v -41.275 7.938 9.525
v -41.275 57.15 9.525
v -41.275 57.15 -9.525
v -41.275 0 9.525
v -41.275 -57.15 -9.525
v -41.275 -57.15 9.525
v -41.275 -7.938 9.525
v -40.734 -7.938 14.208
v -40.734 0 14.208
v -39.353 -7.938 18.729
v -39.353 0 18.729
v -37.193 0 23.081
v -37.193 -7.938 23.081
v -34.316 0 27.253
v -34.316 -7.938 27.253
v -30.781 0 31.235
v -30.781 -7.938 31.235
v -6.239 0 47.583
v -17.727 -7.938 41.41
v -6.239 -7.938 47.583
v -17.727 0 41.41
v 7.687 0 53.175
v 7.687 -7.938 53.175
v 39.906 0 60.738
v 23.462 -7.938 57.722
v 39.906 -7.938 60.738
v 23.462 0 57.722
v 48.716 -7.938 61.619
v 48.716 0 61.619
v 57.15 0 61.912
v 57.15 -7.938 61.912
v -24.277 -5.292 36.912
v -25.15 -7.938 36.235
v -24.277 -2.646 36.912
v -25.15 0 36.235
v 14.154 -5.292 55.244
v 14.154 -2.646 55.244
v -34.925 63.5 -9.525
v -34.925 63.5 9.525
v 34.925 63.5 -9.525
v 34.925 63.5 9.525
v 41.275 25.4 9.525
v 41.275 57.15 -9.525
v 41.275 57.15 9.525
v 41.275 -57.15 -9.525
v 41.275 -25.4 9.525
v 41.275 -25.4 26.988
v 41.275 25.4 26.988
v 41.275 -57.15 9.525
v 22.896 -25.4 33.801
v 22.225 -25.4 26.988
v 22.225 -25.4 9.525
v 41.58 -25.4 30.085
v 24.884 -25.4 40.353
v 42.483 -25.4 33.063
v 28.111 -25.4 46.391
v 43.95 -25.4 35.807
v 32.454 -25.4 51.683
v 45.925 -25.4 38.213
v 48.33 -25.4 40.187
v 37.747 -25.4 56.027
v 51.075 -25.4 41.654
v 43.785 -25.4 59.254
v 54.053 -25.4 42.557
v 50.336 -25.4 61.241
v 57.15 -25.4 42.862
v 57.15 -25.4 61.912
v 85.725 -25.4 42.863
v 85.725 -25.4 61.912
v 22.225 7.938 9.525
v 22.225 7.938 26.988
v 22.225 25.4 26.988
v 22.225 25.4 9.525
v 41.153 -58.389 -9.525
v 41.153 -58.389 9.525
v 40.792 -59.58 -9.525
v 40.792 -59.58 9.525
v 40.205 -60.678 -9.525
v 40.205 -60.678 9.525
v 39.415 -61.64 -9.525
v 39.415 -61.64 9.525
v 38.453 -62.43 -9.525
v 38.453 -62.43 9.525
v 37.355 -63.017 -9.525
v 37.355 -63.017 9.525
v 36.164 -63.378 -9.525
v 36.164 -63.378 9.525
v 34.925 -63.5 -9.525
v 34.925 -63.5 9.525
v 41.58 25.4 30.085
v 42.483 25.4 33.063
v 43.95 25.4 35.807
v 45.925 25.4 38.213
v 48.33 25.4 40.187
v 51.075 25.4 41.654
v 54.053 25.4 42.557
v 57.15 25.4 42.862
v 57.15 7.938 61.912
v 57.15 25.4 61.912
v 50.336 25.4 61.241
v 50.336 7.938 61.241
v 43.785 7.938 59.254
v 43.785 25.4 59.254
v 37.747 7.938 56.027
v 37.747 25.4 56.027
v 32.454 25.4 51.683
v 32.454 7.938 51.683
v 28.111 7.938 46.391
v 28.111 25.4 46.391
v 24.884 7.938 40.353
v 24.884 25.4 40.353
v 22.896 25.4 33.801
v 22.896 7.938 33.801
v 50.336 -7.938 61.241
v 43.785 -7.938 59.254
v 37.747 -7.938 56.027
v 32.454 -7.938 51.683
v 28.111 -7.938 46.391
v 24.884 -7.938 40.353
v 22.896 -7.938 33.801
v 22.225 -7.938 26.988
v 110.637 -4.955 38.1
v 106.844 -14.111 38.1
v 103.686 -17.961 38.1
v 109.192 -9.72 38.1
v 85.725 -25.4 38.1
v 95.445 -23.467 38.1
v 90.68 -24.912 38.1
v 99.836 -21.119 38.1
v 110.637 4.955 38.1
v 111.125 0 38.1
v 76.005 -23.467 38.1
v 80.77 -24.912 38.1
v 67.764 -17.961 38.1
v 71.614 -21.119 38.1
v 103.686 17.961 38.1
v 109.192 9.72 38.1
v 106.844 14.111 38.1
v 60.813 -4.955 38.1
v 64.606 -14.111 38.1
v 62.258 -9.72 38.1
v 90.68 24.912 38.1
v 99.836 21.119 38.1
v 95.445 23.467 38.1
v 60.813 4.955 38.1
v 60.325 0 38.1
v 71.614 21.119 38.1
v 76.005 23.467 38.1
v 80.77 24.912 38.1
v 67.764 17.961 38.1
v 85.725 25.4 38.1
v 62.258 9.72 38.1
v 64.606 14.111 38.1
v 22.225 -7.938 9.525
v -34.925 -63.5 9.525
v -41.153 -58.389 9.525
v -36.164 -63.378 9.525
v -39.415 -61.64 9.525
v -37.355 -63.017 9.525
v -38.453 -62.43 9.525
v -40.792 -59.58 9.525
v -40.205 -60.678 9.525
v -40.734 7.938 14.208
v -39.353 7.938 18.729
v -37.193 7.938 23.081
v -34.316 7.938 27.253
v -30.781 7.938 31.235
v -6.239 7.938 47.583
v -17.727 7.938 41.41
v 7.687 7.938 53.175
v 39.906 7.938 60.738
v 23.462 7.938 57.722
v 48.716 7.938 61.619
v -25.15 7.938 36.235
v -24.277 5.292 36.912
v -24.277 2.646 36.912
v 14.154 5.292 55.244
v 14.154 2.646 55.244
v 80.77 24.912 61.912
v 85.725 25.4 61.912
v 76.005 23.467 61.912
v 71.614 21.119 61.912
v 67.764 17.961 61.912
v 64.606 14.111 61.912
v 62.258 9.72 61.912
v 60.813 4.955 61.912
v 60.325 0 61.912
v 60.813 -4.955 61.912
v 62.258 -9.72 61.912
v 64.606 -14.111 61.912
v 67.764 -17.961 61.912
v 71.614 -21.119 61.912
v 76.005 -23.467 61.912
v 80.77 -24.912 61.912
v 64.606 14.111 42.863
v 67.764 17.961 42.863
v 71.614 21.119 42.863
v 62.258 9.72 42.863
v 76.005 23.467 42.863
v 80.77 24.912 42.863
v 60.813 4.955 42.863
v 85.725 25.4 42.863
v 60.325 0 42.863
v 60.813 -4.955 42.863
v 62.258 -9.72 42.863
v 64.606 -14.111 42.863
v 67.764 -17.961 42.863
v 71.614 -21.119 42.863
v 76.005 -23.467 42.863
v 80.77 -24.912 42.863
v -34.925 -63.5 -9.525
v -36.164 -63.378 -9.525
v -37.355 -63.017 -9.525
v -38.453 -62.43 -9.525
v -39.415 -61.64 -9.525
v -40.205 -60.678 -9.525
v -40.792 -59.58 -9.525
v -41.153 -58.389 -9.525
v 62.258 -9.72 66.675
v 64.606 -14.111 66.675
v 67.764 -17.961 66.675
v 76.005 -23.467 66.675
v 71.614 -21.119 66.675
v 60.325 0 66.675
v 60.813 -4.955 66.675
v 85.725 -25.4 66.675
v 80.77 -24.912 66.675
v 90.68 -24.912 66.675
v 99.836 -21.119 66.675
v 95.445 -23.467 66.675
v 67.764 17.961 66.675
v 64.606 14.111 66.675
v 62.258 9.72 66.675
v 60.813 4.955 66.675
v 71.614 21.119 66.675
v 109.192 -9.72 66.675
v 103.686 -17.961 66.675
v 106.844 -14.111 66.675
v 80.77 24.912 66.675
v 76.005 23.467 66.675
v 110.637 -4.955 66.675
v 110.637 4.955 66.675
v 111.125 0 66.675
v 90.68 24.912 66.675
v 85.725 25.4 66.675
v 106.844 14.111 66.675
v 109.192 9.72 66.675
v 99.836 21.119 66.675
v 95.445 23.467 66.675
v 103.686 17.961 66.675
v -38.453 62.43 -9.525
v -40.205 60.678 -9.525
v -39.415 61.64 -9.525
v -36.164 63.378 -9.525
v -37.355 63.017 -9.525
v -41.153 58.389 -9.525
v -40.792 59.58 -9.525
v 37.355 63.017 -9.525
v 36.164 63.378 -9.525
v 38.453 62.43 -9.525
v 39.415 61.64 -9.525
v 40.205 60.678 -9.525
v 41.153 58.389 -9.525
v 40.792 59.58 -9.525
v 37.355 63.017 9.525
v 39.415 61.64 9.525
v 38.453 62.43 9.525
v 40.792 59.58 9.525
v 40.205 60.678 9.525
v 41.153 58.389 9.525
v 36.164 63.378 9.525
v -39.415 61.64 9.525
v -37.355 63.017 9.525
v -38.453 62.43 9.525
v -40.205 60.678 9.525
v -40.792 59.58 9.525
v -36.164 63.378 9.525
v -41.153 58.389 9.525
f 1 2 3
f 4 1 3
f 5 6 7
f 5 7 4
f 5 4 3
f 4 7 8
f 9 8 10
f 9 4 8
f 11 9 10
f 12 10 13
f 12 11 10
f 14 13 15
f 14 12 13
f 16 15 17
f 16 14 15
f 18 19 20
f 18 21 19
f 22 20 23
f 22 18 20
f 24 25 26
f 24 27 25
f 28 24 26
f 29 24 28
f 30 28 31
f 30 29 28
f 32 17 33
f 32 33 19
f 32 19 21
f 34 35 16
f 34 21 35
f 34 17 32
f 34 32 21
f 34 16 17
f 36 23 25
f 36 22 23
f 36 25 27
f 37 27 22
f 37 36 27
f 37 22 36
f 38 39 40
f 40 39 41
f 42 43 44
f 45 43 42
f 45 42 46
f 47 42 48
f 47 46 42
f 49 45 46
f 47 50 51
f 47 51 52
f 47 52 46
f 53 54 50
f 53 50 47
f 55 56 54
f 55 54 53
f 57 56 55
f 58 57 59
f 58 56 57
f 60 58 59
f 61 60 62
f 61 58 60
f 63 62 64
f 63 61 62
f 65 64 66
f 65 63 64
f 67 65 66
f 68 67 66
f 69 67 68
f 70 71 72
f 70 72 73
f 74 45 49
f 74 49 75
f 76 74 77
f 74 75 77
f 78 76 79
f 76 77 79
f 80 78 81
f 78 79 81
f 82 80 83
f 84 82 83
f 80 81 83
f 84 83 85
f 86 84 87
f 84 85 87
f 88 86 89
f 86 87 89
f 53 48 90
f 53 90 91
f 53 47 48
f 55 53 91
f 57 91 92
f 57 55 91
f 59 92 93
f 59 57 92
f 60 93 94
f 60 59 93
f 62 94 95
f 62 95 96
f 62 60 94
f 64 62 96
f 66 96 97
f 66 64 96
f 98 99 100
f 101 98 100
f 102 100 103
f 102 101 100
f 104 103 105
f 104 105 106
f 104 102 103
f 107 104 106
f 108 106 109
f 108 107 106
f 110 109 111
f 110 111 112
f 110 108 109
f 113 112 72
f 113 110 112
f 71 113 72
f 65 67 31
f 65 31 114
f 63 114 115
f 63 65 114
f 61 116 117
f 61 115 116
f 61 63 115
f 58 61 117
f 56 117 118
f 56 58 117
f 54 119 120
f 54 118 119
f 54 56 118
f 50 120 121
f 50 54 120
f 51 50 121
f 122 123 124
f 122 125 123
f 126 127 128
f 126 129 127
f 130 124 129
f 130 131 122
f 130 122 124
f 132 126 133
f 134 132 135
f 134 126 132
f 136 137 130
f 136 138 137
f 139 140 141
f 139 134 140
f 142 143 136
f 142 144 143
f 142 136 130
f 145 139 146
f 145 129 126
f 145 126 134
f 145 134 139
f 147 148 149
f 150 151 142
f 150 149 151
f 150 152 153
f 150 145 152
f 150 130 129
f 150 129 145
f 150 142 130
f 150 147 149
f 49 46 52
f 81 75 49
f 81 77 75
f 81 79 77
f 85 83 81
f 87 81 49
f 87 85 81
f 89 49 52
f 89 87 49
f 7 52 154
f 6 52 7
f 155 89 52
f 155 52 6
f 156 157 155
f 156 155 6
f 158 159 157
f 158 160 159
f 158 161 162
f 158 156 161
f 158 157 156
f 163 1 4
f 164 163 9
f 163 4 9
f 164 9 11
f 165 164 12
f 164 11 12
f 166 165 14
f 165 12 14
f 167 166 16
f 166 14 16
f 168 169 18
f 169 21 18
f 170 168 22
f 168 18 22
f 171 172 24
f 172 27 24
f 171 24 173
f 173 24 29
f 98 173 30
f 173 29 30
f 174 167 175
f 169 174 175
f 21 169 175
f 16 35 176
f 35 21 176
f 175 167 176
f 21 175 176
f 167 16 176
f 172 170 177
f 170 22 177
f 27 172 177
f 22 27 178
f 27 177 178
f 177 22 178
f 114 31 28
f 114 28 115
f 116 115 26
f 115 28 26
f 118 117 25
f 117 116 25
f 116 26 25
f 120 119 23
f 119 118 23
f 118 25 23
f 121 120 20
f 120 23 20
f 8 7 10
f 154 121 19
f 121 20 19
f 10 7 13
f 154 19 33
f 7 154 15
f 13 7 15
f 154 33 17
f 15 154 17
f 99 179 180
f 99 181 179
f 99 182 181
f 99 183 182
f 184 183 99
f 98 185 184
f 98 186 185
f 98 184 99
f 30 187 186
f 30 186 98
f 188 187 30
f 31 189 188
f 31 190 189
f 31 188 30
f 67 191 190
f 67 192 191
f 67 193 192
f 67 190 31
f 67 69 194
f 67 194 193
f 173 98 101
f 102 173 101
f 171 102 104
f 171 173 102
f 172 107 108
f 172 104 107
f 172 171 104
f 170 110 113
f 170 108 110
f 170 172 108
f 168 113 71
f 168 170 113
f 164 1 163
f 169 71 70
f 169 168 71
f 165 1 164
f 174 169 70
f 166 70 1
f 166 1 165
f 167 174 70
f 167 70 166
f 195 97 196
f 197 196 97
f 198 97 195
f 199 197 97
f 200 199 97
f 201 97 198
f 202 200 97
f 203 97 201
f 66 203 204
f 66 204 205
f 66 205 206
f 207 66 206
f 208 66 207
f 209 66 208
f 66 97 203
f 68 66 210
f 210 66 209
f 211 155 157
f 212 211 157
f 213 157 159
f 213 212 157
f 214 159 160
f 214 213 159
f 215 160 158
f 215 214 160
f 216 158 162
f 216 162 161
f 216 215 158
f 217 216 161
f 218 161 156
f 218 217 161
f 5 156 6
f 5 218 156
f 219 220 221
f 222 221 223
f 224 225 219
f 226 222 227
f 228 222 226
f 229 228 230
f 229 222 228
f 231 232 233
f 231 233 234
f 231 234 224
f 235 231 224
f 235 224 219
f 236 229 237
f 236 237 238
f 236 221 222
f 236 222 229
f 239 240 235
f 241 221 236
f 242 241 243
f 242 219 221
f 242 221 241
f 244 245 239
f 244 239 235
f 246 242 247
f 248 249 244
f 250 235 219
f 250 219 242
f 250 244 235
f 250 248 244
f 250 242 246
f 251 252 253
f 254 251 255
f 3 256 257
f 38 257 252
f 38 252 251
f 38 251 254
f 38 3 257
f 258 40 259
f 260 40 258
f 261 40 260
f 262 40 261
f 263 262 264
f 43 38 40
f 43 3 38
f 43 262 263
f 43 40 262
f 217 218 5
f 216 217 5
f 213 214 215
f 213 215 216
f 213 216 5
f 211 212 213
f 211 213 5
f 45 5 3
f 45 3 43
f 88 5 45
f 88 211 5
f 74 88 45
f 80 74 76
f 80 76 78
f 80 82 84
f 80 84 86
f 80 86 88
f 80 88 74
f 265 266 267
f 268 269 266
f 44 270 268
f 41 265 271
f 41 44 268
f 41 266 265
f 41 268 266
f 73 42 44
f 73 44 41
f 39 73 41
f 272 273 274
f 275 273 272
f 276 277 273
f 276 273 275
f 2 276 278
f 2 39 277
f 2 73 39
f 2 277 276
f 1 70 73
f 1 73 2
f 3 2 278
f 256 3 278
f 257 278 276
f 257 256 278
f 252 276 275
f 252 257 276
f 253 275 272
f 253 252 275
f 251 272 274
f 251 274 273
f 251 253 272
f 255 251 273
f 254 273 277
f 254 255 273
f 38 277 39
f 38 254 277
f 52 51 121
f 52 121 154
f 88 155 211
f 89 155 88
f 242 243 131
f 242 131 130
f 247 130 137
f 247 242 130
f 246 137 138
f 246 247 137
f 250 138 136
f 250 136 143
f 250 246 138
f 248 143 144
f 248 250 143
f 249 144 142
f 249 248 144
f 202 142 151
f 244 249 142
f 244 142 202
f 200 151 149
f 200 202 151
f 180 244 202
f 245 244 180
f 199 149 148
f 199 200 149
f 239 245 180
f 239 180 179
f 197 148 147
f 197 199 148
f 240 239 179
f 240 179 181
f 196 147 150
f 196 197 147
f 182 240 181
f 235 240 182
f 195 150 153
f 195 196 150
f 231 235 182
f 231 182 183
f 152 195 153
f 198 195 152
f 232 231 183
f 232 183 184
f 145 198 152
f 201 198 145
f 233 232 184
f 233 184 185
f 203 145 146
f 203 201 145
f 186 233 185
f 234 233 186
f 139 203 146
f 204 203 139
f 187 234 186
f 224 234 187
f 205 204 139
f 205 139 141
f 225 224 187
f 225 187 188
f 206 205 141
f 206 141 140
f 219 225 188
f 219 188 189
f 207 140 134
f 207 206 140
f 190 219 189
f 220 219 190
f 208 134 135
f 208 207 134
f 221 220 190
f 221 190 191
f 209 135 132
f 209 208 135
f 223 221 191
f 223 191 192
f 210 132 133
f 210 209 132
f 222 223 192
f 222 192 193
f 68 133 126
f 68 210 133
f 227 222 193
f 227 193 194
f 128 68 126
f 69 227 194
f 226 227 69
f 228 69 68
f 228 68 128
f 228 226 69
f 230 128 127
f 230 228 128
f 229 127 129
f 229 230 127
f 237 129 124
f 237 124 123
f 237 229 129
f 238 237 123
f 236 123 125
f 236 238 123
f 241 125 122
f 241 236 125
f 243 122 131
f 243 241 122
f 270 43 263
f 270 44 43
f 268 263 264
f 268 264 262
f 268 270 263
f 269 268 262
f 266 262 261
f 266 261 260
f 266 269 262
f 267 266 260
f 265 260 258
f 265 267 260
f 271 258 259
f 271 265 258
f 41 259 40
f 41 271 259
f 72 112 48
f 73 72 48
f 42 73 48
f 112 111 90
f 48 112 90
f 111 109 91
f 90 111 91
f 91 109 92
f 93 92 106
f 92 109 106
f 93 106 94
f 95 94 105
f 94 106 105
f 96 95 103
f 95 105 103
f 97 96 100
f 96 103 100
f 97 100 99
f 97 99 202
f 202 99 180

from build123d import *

# Parameters (mm, degrees)
F1_DEPTH = 63.5
F0_W     = 25.4
F0_H     = 19.05
F2_DEPTH = 25.4
F3_DEPTH = 7.9375
F5_R     = 6.35


# Not quite as in the source:
# - a feature names something its author has since deleted; it is built from what else it names


with BuildPart() as f1:
    # F0 (on Front) → F1 (new body, symmetric)
    with BuildSketch(Plane.XZ):
        Polygon((-41.275, 9.525), (-41.275, -9.525), (41.275, -9.525), (41.275, 9.525), (22.225, 9.525), align=None)
    extrude(amount=F1_DEPTH, both=True)

    # F0 (on Front) → F2 (join, symmetric)
    with BuildSketch(Plane.XZ):
        with Locations((73.025, 52.3875)):
            Rectangle(F0_W, F0_H)
        with BuildLine():
            Line((22.225, 9.525), (41.275, 9.525))
            Line((41.275, 9.525), (41.275, 26.9875))
            ThreePointArc((41.275, 26.9875), (45.9246798487, 38.2128201513), (57.15, 42.8625))
            Line((57.15, 42.8625), (60.325, 42.8625))
            Line((60.325, 42.8625), (60.325, 61.9125))
            Line((60.325, 61.9125), (57.15, 61.9125))
            ThreePointArc((57.15, 61.9125), (32.4542956671, 51.6832043329), (22.225, 26.9875))
            Line((22.225, 26.9875), (22.225, 9.525))
        make_face()
    extrude(amount=F2_DEPTH, both=True)

    # F0 (on Front) → F3 (join, symmetric)
    with BuildSketch(Plane.XZ):
        with BuildLine():
            add(Edge.make_bspline(
                [(-41.275, 9.525), (-40.6160876155, 40.568407625), (17.4937602133, 61.9470998645), (57.15, 61.9125)],
                knots=[0, 0, 0, 0, 111.4985685166, 111.4985685166, 111.4985685166, 111.4985685166], degree=3))
            Line((-41.275, 9.525), (22.225, 9.525))
            Line((22.225, 9.525), (22.225, 26.9875))
            ThreePointArc((22.225, 26.9875), (32.4542956671, 51.6832043329), (57.15, 61.9125))
        make_face()
    extrude(amount=F3_DEPTH, both=True)

    # F0 (on Front) → F4 (revolve)
    with BuildSketch(Plane.XZ):
        Polygon((85.725, 66.675), (85.725, 61.9125), (85.725, 42.8625), (85.725, 38.1), (111.125, 38.1), (111.125, 66.675), align=None)
    revolve(axis=Axis((85.725, 0, 52.3875), (0, 0, 1)))

    # F5
    f5_edges = [f1.edges().sort_by_distance(p)[0] for p in [
        (41.275, -63.5, 0),
        (-41.275, -63.5, 0),
        (41.275, 63.5, 0),
        (-41.275, 63.5, 0),
    ]]
    fillet(f5_edges, radius=F5_R)


solid = f1.part
